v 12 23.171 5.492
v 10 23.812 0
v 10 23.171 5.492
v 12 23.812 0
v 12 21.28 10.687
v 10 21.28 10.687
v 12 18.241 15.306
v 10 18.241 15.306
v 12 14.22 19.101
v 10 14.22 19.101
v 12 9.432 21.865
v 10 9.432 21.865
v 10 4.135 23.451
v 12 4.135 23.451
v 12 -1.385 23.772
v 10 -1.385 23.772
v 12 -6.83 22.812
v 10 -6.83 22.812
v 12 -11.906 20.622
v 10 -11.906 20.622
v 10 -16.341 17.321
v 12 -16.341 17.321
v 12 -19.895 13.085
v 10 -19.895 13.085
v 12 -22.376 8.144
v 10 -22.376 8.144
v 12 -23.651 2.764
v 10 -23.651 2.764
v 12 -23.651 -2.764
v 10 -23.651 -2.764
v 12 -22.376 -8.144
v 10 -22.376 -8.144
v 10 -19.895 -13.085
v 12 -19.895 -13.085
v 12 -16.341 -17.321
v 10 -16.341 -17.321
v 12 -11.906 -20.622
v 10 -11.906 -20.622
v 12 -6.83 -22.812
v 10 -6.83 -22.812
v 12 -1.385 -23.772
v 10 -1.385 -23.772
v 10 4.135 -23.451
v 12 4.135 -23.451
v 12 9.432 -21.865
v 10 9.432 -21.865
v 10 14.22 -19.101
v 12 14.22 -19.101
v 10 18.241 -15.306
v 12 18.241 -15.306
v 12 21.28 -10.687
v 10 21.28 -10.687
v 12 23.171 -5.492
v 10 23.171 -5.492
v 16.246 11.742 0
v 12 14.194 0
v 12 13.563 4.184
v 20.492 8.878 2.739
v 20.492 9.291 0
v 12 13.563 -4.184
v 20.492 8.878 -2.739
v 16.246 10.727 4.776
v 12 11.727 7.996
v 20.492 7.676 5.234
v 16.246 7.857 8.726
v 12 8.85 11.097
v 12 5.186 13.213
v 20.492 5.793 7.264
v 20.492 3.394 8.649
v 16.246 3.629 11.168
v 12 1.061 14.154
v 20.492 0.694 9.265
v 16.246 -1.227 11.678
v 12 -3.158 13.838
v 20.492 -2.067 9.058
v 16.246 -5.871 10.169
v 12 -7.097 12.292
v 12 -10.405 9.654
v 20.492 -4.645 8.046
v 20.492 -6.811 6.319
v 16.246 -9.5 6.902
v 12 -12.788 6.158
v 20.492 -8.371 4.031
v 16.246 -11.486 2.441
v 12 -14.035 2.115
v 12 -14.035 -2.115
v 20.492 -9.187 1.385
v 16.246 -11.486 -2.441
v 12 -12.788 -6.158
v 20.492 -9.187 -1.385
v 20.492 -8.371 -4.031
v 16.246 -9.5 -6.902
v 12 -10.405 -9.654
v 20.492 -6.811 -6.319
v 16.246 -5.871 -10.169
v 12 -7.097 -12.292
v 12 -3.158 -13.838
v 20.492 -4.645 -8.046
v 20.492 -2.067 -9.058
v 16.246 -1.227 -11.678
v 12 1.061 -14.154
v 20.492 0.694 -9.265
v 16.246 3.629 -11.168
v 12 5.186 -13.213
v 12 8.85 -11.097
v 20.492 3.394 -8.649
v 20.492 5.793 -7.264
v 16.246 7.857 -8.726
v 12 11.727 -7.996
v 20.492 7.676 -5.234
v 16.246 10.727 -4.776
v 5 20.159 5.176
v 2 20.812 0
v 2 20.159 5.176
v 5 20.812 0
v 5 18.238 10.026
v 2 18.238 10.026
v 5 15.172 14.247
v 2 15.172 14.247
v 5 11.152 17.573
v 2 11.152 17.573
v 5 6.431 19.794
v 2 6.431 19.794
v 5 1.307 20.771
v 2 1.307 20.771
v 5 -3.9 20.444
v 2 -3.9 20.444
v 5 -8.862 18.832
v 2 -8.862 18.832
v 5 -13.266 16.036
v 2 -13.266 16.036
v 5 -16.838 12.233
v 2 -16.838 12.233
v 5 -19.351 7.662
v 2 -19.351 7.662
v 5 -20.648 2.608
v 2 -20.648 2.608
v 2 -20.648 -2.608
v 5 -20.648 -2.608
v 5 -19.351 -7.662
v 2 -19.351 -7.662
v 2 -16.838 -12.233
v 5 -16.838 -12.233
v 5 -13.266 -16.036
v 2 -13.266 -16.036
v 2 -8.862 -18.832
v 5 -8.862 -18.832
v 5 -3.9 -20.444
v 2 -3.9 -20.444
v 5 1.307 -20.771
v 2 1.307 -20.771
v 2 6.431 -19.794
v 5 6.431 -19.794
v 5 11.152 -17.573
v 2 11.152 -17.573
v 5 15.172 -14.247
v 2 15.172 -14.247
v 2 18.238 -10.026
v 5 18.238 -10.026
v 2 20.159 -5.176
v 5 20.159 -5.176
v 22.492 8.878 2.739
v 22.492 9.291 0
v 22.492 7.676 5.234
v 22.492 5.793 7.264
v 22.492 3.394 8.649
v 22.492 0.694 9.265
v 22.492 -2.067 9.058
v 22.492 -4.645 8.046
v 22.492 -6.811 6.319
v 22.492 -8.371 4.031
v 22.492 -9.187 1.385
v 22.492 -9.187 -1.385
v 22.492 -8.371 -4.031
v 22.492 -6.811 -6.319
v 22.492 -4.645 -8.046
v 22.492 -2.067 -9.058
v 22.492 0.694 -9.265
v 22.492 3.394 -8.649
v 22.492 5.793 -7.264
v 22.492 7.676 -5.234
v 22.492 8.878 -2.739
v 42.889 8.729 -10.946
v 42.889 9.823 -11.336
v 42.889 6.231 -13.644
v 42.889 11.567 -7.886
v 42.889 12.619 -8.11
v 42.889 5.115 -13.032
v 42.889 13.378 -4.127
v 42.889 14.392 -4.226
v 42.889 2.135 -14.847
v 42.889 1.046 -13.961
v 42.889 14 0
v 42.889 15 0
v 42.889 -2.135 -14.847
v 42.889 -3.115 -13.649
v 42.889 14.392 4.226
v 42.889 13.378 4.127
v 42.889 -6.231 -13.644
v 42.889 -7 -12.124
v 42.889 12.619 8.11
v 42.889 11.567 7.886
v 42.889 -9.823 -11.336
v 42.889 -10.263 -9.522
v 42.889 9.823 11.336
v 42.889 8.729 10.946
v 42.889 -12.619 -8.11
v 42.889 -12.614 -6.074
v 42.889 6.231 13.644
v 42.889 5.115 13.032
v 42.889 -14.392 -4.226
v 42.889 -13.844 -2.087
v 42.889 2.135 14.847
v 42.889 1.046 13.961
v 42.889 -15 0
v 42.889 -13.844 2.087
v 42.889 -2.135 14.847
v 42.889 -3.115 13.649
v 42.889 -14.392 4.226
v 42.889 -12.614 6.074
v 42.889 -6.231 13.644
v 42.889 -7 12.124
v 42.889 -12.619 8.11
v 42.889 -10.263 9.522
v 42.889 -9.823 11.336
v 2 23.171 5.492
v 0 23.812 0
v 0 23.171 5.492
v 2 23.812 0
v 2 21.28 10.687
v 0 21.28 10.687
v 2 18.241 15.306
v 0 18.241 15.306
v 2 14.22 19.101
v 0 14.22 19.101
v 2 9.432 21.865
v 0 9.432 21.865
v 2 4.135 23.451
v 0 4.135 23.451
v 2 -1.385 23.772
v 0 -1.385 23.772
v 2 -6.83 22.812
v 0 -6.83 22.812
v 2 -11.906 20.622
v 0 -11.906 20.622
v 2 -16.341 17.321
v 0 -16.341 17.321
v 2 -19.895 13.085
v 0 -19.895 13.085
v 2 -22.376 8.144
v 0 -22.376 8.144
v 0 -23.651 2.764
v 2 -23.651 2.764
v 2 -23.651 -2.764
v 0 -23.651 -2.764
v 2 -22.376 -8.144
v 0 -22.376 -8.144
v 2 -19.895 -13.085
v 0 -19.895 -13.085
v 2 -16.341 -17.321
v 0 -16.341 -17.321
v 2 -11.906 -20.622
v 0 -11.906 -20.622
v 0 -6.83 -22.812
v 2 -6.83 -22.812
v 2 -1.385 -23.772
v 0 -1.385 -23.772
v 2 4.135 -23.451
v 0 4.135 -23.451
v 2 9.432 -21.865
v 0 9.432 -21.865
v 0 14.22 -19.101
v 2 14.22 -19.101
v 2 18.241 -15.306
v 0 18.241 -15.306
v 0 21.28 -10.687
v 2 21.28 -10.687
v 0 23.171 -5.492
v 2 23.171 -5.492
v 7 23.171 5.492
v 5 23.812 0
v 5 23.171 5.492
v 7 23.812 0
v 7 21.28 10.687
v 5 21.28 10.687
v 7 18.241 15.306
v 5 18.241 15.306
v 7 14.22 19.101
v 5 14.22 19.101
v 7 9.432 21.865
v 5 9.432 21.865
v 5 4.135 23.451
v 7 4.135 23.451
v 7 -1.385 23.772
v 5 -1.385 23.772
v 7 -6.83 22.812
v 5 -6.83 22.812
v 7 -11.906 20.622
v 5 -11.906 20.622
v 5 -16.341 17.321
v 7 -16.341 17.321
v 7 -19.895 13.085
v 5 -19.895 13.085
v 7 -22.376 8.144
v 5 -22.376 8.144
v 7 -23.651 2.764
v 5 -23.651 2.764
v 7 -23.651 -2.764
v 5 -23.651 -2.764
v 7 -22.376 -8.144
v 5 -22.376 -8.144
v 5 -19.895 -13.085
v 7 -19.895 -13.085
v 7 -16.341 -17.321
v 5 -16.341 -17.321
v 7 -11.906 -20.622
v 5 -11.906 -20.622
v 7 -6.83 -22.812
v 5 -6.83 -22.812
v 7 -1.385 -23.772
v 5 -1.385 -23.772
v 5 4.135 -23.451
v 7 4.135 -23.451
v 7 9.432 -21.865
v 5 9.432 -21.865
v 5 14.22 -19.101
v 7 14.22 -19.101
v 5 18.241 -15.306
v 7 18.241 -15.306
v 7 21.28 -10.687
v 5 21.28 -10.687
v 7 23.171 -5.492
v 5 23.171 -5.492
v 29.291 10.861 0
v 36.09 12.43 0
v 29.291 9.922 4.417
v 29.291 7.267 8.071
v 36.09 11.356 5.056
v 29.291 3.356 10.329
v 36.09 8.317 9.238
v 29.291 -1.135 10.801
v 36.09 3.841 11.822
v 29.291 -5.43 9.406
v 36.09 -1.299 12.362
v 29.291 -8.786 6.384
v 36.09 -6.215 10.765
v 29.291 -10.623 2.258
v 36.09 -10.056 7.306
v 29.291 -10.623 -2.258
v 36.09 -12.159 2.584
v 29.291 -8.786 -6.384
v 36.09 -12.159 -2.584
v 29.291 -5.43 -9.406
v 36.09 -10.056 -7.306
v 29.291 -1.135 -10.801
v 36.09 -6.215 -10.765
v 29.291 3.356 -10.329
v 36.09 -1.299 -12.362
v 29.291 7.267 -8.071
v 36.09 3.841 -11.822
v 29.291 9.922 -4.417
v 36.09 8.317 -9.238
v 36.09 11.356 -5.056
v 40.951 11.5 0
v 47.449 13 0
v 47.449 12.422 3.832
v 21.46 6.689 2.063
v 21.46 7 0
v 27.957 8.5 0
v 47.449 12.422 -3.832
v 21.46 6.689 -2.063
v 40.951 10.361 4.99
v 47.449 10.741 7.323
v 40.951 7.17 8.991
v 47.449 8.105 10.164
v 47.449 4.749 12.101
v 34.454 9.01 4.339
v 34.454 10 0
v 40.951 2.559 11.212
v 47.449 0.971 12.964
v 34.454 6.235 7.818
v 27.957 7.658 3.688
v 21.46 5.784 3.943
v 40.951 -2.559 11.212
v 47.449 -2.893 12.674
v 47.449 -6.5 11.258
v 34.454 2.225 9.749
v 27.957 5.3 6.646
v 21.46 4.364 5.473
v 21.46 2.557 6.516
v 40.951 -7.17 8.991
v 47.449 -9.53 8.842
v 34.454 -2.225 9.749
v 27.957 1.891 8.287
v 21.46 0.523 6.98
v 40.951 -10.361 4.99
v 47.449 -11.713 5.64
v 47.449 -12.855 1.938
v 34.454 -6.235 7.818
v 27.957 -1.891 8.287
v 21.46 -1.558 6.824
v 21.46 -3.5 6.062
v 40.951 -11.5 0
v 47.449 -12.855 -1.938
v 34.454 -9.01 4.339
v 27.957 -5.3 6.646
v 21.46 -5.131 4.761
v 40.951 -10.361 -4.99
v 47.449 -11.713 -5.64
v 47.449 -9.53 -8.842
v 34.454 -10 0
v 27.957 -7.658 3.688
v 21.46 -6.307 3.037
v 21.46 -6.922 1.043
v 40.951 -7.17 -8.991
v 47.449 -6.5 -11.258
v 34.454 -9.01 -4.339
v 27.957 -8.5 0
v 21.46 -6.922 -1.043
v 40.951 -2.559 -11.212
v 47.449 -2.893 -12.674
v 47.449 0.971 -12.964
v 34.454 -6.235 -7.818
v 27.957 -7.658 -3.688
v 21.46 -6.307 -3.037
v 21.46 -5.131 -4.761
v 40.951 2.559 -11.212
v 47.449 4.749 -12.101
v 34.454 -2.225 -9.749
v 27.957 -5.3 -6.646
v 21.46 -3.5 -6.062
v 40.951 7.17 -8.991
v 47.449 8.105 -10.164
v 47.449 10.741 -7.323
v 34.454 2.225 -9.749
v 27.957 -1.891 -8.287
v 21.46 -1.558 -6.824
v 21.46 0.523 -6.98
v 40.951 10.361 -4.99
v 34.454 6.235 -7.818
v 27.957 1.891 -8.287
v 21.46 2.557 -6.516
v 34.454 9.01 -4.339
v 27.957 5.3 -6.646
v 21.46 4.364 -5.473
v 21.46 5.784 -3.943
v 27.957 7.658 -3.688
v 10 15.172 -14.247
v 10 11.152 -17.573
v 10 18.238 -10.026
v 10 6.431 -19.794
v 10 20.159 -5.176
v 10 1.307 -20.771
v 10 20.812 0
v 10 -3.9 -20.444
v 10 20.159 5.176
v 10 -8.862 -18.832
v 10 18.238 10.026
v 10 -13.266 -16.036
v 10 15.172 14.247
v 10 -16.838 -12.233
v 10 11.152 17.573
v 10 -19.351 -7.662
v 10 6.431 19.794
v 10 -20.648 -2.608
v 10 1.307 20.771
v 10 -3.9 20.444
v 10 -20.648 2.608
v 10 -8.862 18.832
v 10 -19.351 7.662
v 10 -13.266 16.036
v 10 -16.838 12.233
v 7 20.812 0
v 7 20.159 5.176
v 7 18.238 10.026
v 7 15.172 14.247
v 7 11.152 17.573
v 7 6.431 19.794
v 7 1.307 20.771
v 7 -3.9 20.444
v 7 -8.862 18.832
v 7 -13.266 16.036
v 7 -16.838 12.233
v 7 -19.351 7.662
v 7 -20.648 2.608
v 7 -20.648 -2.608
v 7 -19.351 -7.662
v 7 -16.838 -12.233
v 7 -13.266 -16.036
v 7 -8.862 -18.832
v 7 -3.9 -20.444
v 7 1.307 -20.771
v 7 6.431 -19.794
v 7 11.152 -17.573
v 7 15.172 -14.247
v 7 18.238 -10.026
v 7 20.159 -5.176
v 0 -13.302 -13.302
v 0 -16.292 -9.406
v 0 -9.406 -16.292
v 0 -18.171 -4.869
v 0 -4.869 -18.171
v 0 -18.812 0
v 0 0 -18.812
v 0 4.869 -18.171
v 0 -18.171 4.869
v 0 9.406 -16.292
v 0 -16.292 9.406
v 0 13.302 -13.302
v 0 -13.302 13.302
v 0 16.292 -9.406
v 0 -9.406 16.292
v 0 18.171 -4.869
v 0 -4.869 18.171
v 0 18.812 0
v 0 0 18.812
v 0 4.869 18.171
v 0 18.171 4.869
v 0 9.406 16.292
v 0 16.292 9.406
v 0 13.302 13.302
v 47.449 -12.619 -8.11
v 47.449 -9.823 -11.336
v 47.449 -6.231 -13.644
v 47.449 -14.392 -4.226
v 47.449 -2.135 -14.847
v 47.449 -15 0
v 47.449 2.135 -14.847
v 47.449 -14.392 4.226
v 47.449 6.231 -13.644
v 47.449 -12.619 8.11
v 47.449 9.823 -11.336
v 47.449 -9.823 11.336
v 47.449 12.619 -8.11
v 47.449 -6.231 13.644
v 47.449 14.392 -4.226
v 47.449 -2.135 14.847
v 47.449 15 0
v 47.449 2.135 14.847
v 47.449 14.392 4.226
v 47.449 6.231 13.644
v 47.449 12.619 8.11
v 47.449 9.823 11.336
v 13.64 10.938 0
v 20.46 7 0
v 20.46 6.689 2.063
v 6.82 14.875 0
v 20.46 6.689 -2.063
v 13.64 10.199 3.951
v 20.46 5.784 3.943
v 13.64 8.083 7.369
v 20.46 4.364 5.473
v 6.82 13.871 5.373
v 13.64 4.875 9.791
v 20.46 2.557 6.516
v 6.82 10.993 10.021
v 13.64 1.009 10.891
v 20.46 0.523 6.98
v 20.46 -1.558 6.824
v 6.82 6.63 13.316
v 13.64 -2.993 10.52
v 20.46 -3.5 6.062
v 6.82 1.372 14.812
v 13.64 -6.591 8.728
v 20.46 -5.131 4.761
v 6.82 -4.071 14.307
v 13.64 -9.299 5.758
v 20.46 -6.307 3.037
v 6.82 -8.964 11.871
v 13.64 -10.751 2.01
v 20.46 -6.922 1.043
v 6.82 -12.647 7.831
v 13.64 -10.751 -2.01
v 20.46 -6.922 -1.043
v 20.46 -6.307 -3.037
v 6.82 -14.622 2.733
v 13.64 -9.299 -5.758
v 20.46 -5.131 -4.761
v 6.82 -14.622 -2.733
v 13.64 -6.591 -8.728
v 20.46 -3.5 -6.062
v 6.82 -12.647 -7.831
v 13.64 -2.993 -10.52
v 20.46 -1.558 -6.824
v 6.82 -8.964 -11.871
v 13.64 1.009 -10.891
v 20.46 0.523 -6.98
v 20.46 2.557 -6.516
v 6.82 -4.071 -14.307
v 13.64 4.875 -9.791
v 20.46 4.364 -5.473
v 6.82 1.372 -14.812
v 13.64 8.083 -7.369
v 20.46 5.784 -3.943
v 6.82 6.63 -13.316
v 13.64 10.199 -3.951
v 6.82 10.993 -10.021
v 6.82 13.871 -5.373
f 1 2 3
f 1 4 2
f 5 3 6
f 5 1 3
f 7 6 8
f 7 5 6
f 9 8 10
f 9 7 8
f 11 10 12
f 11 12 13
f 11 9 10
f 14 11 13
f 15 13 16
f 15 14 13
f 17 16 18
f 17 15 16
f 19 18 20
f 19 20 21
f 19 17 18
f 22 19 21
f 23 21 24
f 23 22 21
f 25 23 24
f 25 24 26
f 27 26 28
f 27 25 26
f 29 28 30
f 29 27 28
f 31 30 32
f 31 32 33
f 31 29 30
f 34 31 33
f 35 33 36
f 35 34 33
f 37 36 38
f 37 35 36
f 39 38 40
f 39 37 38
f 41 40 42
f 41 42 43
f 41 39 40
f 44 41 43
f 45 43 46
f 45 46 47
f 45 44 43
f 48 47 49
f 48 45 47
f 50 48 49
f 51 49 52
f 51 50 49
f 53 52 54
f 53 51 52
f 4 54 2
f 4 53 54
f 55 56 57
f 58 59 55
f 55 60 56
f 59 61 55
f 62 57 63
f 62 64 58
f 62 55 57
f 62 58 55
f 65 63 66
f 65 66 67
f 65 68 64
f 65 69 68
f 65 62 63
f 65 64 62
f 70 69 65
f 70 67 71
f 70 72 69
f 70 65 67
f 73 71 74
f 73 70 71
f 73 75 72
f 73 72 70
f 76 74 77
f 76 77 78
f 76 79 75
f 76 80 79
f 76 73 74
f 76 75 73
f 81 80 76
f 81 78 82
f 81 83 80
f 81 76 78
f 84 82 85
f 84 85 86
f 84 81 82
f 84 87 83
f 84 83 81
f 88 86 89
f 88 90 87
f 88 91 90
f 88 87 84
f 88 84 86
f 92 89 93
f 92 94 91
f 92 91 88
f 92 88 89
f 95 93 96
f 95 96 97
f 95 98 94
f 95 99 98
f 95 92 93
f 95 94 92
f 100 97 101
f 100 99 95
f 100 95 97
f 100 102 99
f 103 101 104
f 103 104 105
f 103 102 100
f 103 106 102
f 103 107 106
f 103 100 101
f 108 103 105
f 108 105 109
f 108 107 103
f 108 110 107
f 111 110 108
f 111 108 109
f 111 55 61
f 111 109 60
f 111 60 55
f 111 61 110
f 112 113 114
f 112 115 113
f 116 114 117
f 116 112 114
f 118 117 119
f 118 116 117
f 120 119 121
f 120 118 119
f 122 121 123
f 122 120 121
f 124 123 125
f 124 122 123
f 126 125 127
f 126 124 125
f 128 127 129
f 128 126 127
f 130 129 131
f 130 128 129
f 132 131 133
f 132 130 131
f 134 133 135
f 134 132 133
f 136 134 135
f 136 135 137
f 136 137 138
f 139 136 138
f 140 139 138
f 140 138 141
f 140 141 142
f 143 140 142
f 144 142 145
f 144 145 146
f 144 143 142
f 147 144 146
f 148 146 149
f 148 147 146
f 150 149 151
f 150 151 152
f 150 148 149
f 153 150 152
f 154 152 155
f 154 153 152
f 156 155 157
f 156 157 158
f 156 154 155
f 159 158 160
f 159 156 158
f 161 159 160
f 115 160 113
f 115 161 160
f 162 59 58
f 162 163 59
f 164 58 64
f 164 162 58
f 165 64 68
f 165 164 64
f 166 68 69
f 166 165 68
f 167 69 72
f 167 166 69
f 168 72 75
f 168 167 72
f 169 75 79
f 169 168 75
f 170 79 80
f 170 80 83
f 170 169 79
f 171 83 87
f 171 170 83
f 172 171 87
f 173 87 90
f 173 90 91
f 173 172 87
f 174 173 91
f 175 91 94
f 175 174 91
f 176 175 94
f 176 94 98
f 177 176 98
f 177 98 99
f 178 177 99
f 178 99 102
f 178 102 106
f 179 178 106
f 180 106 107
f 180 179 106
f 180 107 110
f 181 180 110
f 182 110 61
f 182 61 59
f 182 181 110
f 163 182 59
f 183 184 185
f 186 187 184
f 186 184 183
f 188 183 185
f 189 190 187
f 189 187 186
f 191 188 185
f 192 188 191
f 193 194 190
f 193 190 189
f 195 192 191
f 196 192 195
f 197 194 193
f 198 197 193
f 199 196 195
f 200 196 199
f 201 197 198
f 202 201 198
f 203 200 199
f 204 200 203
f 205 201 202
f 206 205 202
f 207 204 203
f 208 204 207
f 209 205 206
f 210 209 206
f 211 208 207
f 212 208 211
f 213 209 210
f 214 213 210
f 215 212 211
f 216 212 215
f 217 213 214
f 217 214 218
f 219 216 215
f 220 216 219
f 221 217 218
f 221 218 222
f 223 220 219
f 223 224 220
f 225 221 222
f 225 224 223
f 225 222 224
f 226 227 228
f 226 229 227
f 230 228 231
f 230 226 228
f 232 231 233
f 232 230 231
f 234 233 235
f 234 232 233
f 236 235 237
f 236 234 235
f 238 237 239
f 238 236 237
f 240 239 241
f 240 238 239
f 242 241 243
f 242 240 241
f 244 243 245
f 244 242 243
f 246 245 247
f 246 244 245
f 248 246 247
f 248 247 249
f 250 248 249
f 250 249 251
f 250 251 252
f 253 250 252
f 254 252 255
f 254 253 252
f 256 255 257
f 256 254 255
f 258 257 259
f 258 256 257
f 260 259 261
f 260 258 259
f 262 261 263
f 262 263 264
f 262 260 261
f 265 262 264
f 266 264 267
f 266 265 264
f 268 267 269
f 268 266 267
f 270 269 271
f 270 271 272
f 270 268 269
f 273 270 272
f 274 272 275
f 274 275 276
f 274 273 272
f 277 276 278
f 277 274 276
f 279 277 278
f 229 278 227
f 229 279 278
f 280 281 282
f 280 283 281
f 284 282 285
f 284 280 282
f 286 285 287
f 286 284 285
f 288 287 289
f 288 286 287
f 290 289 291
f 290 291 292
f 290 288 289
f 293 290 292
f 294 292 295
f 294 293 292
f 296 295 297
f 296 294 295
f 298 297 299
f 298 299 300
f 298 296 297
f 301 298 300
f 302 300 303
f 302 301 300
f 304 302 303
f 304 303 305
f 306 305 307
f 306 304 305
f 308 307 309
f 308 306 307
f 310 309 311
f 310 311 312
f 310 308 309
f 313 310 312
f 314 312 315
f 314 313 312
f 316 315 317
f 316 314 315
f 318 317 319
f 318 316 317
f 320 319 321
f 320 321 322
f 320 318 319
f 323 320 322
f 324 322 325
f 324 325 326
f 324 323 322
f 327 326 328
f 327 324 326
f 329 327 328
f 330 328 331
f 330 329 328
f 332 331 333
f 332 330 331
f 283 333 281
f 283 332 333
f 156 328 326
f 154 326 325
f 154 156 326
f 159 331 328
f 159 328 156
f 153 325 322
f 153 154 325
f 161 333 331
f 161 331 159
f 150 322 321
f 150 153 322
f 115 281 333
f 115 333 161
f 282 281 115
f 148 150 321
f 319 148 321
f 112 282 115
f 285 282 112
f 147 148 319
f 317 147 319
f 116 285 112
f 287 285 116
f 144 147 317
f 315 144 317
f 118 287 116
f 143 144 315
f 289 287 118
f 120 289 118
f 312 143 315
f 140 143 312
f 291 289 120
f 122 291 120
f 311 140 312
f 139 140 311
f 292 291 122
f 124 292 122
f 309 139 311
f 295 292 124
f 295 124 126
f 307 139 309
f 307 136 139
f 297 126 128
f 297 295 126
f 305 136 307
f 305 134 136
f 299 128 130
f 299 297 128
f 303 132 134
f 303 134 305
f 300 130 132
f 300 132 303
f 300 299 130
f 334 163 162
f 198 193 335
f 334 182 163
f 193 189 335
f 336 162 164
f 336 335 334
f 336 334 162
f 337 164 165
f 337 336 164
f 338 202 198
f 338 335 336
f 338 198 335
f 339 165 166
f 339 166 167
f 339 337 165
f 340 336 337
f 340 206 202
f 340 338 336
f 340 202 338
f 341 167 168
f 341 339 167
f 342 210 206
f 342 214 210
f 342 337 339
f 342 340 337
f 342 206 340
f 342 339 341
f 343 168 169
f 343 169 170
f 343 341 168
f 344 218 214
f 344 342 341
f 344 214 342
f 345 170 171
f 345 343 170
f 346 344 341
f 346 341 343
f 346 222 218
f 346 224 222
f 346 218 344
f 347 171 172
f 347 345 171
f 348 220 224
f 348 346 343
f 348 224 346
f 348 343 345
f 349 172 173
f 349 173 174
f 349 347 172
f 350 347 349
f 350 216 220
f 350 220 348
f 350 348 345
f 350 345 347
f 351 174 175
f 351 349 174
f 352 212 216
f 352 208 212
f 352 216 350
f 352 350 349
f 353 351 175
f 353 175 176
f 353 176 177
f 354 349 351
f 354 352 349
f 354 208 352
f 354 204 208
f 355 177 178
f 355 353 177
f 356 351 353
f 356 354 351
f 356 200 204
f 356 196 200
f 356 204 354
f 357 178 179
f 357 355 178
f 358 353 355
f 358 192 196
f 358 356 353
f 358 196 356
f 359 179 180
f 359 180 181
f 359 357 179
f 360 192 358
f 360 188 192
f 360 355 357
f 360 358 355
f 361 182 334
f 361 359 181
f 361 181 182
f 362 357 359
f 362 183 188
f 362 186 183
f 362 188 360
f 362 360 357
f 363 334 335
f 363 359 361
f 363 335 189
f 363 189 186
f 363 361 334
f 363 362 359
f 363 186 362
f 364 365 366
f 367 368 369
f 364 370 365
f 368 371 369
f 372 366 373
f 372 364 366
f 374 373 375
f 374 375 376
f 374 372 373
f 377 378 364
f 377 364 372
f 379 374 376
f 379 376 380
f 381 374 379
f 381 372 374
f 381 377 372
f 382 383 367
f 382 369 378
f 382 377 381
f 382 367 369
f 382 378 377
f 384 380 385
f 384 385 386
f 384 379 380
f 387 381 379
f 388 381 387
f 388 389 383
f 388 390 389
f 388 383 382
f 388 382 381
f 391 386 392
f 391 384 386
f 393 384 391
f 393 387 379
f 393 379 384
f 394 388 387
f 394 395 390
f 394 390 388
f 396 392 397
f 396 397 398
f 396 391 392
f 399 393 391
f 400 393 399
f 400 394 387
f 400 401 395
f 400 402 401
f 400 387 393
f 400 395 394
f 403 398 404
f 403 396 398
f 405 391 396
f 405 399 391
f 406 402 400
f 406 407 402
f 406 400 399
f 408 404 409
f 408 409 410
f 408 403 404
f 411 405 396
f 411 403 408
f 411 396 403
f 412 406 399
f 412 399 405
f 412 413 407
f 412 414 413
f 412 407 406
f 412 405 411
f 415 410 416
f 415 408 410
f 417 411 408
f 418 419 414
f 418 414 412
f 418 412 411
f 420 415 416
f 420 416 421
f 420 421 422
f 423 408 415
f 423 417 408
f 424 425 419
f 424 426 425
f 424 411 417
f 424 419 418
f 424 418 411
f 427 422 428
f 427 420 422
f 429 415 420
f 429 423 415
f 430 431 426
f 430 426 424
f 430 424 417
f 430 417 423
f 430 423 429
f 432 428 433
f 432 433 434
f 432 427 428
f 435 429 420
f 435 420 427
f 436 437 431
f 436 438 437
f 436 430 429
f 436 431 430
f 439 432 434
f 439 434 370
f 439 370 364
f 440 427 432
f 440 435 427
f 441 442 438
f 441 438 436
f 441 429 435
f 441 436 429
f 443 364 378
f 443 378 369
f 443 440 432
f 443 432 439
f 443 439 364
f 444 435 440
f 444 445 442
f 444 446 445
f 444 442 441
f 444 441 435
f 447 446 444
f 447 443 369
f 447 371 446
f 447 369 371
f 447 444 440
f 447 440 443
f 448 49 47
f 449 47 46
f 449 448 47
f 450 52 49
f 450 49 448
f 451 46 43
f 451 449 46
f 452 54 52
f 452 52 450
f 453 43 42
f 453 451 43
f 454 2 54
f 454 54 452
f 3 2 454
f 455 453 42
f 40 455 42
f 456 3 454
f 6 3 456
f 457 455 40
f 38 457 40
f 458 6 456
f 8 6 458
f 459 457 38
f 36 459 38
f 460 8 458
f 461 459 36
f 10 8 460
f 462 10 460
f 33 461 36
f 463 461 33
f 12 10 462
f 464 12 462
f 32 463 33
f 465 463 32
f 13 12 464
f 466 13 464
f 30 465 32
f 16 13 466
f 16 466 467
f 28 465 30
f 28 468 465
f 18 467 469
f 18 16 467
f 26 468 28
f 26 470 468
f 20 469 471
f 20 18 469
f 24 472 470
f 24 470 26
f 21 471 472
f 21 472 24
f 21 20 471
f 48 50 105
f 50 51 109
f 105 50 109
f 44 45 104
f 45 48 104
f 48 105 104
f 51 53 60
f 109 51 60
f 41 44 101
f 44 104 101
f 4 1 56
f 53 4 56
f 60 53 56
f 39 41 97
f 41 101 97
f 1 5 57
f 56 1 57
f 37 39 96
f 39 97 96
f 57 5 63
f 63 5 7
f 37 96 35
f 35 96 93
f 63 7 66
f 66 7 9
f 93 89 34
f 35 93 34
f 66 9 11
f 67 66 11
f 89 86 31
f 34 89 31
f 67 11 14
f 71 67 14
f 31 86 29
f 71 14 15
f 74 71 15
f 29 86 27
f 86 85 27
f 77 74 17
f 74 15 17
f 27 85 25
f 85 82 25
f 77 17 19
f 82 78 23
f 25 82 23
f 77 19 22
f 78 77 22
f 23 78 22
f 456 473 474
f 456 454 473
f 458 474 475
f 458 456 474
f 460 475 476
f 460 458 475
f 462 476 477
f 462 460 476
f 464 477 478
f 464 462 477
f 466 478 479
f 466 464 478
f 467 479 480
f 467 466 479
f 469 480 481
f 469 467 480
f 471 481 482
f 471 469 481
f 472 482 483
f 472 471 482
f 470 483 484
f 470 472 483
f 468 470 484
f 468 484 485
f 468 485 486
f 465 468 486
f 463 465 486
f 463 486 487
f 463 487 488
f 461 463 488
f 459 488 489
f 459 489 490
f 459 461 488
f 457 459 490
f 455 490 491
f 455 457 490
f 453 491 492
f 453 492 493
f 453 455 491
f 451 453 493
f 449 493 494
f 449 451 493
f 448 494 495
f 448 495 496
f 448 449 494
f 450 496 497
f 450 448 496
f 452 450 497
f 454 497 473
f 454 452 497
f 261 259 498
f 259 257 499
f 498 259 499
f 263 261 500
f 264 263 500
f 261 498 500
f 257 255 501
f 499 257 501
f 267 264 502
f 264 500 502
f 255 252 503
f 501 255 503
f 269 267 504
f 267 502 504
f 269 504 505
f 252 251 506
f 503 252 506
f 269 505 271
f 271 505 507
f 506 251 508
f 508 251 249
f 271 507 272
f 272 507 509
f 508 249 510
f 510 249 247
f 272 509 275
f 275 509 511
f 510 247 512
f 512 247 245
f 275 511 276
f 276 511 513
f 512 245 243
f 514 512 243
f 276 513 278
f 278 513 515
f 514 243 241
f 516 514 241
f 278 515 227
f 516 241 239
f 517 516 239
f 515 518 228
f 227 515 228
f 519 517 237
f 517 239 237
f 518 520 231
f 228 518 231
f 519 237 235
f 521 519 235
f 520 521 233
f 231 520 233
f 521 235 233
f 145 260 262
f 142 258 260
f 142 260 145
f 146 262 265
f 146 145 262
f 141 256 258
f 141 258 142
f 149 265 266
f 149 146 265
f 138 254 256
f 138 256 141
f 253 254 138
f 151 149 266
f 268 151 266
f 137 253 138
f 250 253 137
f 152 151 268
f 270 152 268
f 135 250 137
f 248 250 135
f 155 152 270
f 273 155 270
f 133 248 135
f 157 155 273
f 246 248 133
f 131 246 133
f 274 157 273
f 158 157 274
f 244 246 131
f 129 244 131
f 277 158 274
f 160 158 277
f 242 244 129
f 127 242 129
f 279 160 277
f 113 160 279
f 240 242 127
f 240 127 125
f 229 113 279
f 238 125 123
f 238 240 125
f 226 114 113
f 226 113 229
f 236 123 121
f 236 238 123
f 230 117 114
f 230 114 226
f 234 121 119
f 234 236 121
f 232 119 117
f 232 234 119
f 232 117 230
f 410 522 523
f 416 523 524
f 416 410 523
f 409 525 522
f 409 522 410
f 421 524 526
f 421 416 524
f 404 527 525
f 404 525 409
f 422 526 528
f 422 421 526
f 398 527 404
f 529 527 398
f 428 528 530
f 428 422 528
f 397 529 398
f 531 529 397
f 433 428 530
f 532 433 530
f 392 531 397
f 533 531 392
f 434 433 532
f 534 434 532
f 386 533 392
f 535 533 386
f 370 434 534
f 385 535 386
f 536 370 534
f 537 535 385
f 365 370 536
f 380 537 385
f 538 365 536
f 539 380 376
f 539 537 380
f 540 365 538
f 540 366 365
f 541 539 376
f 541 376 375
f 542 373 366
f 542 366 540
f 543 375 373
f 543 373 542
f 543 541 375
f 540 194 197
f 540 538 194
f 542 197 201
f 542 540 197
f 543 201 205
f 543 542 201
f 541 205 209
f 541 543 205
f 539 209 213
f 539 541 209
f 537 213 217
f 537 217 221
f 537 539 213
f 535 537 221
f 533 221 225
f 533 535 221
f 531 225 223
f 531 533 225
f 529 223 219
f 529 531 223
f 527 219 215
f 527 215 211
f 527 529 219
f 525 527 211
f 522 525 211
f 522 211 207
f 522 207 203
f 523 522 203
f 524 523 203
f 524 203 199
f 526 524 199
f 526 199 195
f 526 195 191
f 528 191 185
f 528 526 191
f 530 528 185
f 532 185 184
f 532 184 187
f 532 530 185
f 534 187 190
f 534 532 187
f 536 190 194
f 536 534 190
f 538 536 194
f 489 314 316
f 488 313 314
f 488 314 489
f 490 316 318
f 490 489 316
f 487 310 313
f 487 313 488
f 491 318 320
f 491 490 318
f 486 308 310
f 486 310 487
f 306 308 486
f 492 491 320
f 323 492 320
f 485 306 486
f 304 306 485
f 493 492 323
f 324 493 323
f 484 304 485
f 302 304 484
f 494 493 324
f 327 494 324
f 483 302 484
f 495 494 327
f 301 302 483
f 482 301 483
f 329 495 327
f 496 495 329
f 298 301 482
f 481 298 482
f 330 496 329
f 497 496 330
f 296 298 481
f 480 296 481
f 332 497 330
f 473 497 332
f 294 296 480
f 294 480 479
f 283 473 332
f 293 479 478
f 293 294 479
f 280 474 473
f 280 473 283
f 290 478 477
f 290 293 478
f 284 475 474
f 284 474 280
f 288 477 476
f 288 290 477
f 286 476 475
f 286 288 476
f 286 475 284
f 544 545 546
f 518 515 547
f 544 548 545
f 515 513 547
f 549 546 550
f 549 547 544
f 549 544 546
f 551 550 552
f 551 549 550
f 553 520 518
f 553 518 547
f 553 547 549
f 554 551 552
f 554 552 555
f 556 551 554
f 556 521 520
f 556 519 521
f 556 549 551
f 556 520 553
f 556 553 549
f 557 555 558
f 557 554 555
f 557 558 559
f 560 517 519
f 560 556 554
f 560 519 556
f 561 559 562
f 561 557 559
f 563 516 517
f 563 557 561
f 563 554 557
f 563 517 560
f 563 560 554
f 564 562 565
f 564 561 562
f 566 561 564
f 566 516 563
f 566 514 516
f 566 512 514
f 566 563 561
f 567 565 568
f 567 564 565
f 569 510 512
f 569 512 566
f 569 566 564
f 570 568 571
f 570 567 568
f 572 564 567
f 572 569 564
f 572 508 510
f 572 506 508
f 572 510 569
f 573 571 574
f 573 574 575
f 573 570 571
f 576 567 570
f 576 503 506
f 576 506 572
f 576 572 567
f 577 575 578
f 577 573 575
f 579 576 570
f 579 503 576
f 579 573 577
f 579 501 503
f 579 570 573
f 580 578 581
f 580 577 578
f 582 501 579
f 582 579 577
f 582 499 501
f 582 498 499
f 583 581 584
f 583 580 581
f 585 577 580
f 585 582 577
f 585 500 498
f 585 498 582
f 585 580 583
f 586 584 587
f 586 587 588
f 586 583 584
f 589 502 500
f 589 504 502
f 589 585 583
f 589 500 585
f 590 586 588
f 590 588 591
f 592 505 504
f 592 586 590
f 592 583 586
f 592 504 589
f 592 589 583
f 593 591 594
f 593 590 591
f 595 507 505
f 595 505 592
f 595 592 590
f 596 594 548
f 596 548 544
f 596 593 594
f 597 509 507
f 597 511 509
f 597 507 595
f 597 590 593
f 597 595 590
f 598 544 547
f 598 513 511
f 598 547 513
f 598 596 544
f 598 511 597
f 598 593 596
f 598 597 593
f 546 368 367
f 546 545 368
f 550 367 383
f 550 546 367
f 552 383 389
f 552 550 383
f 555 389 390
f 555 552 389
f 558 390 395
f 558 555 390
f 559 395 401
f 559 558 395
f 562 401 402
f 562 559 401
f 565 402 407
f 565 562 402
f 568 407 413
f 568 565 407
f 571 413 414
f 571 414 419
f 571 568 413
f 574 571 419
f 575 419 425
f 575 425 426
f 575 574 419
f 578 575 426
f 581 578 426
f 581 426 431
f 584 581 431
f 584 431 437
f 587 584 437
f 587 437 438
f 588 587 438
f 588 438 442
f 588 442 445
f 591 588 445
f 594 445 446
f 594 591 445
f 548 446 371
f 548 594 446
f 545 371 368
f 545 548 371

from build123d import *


with BuildPart() as part:
    # Esboço2 → Revolução1 (revolve)
    with BuildSketch(Plane.XY):
        Polygon((0, 23.8125), (2, 23.8125), (2, 20.8125), (5, 20.8125), (5, 23.8125), (7, 23.8125), (7, 20.8125), (10, 20.8125), (10, 23.8125), (12, 23.8125), (12, 20.8125), (12, 14.193697846), (20.49192648, 9.290881808), (22.49192648, 9.290881808), (42.889358319, 14), (42.889358319, 15), (47.44870541, 15), (47.44870541, 13), (21.459850164, 7), (20.459850164, 7), (0, 18.8125), (0, 20.8125), align=None)
    revolve(axis=Axis((-1000, 0, 0), (1, 0, 0)))


solid = part.part
